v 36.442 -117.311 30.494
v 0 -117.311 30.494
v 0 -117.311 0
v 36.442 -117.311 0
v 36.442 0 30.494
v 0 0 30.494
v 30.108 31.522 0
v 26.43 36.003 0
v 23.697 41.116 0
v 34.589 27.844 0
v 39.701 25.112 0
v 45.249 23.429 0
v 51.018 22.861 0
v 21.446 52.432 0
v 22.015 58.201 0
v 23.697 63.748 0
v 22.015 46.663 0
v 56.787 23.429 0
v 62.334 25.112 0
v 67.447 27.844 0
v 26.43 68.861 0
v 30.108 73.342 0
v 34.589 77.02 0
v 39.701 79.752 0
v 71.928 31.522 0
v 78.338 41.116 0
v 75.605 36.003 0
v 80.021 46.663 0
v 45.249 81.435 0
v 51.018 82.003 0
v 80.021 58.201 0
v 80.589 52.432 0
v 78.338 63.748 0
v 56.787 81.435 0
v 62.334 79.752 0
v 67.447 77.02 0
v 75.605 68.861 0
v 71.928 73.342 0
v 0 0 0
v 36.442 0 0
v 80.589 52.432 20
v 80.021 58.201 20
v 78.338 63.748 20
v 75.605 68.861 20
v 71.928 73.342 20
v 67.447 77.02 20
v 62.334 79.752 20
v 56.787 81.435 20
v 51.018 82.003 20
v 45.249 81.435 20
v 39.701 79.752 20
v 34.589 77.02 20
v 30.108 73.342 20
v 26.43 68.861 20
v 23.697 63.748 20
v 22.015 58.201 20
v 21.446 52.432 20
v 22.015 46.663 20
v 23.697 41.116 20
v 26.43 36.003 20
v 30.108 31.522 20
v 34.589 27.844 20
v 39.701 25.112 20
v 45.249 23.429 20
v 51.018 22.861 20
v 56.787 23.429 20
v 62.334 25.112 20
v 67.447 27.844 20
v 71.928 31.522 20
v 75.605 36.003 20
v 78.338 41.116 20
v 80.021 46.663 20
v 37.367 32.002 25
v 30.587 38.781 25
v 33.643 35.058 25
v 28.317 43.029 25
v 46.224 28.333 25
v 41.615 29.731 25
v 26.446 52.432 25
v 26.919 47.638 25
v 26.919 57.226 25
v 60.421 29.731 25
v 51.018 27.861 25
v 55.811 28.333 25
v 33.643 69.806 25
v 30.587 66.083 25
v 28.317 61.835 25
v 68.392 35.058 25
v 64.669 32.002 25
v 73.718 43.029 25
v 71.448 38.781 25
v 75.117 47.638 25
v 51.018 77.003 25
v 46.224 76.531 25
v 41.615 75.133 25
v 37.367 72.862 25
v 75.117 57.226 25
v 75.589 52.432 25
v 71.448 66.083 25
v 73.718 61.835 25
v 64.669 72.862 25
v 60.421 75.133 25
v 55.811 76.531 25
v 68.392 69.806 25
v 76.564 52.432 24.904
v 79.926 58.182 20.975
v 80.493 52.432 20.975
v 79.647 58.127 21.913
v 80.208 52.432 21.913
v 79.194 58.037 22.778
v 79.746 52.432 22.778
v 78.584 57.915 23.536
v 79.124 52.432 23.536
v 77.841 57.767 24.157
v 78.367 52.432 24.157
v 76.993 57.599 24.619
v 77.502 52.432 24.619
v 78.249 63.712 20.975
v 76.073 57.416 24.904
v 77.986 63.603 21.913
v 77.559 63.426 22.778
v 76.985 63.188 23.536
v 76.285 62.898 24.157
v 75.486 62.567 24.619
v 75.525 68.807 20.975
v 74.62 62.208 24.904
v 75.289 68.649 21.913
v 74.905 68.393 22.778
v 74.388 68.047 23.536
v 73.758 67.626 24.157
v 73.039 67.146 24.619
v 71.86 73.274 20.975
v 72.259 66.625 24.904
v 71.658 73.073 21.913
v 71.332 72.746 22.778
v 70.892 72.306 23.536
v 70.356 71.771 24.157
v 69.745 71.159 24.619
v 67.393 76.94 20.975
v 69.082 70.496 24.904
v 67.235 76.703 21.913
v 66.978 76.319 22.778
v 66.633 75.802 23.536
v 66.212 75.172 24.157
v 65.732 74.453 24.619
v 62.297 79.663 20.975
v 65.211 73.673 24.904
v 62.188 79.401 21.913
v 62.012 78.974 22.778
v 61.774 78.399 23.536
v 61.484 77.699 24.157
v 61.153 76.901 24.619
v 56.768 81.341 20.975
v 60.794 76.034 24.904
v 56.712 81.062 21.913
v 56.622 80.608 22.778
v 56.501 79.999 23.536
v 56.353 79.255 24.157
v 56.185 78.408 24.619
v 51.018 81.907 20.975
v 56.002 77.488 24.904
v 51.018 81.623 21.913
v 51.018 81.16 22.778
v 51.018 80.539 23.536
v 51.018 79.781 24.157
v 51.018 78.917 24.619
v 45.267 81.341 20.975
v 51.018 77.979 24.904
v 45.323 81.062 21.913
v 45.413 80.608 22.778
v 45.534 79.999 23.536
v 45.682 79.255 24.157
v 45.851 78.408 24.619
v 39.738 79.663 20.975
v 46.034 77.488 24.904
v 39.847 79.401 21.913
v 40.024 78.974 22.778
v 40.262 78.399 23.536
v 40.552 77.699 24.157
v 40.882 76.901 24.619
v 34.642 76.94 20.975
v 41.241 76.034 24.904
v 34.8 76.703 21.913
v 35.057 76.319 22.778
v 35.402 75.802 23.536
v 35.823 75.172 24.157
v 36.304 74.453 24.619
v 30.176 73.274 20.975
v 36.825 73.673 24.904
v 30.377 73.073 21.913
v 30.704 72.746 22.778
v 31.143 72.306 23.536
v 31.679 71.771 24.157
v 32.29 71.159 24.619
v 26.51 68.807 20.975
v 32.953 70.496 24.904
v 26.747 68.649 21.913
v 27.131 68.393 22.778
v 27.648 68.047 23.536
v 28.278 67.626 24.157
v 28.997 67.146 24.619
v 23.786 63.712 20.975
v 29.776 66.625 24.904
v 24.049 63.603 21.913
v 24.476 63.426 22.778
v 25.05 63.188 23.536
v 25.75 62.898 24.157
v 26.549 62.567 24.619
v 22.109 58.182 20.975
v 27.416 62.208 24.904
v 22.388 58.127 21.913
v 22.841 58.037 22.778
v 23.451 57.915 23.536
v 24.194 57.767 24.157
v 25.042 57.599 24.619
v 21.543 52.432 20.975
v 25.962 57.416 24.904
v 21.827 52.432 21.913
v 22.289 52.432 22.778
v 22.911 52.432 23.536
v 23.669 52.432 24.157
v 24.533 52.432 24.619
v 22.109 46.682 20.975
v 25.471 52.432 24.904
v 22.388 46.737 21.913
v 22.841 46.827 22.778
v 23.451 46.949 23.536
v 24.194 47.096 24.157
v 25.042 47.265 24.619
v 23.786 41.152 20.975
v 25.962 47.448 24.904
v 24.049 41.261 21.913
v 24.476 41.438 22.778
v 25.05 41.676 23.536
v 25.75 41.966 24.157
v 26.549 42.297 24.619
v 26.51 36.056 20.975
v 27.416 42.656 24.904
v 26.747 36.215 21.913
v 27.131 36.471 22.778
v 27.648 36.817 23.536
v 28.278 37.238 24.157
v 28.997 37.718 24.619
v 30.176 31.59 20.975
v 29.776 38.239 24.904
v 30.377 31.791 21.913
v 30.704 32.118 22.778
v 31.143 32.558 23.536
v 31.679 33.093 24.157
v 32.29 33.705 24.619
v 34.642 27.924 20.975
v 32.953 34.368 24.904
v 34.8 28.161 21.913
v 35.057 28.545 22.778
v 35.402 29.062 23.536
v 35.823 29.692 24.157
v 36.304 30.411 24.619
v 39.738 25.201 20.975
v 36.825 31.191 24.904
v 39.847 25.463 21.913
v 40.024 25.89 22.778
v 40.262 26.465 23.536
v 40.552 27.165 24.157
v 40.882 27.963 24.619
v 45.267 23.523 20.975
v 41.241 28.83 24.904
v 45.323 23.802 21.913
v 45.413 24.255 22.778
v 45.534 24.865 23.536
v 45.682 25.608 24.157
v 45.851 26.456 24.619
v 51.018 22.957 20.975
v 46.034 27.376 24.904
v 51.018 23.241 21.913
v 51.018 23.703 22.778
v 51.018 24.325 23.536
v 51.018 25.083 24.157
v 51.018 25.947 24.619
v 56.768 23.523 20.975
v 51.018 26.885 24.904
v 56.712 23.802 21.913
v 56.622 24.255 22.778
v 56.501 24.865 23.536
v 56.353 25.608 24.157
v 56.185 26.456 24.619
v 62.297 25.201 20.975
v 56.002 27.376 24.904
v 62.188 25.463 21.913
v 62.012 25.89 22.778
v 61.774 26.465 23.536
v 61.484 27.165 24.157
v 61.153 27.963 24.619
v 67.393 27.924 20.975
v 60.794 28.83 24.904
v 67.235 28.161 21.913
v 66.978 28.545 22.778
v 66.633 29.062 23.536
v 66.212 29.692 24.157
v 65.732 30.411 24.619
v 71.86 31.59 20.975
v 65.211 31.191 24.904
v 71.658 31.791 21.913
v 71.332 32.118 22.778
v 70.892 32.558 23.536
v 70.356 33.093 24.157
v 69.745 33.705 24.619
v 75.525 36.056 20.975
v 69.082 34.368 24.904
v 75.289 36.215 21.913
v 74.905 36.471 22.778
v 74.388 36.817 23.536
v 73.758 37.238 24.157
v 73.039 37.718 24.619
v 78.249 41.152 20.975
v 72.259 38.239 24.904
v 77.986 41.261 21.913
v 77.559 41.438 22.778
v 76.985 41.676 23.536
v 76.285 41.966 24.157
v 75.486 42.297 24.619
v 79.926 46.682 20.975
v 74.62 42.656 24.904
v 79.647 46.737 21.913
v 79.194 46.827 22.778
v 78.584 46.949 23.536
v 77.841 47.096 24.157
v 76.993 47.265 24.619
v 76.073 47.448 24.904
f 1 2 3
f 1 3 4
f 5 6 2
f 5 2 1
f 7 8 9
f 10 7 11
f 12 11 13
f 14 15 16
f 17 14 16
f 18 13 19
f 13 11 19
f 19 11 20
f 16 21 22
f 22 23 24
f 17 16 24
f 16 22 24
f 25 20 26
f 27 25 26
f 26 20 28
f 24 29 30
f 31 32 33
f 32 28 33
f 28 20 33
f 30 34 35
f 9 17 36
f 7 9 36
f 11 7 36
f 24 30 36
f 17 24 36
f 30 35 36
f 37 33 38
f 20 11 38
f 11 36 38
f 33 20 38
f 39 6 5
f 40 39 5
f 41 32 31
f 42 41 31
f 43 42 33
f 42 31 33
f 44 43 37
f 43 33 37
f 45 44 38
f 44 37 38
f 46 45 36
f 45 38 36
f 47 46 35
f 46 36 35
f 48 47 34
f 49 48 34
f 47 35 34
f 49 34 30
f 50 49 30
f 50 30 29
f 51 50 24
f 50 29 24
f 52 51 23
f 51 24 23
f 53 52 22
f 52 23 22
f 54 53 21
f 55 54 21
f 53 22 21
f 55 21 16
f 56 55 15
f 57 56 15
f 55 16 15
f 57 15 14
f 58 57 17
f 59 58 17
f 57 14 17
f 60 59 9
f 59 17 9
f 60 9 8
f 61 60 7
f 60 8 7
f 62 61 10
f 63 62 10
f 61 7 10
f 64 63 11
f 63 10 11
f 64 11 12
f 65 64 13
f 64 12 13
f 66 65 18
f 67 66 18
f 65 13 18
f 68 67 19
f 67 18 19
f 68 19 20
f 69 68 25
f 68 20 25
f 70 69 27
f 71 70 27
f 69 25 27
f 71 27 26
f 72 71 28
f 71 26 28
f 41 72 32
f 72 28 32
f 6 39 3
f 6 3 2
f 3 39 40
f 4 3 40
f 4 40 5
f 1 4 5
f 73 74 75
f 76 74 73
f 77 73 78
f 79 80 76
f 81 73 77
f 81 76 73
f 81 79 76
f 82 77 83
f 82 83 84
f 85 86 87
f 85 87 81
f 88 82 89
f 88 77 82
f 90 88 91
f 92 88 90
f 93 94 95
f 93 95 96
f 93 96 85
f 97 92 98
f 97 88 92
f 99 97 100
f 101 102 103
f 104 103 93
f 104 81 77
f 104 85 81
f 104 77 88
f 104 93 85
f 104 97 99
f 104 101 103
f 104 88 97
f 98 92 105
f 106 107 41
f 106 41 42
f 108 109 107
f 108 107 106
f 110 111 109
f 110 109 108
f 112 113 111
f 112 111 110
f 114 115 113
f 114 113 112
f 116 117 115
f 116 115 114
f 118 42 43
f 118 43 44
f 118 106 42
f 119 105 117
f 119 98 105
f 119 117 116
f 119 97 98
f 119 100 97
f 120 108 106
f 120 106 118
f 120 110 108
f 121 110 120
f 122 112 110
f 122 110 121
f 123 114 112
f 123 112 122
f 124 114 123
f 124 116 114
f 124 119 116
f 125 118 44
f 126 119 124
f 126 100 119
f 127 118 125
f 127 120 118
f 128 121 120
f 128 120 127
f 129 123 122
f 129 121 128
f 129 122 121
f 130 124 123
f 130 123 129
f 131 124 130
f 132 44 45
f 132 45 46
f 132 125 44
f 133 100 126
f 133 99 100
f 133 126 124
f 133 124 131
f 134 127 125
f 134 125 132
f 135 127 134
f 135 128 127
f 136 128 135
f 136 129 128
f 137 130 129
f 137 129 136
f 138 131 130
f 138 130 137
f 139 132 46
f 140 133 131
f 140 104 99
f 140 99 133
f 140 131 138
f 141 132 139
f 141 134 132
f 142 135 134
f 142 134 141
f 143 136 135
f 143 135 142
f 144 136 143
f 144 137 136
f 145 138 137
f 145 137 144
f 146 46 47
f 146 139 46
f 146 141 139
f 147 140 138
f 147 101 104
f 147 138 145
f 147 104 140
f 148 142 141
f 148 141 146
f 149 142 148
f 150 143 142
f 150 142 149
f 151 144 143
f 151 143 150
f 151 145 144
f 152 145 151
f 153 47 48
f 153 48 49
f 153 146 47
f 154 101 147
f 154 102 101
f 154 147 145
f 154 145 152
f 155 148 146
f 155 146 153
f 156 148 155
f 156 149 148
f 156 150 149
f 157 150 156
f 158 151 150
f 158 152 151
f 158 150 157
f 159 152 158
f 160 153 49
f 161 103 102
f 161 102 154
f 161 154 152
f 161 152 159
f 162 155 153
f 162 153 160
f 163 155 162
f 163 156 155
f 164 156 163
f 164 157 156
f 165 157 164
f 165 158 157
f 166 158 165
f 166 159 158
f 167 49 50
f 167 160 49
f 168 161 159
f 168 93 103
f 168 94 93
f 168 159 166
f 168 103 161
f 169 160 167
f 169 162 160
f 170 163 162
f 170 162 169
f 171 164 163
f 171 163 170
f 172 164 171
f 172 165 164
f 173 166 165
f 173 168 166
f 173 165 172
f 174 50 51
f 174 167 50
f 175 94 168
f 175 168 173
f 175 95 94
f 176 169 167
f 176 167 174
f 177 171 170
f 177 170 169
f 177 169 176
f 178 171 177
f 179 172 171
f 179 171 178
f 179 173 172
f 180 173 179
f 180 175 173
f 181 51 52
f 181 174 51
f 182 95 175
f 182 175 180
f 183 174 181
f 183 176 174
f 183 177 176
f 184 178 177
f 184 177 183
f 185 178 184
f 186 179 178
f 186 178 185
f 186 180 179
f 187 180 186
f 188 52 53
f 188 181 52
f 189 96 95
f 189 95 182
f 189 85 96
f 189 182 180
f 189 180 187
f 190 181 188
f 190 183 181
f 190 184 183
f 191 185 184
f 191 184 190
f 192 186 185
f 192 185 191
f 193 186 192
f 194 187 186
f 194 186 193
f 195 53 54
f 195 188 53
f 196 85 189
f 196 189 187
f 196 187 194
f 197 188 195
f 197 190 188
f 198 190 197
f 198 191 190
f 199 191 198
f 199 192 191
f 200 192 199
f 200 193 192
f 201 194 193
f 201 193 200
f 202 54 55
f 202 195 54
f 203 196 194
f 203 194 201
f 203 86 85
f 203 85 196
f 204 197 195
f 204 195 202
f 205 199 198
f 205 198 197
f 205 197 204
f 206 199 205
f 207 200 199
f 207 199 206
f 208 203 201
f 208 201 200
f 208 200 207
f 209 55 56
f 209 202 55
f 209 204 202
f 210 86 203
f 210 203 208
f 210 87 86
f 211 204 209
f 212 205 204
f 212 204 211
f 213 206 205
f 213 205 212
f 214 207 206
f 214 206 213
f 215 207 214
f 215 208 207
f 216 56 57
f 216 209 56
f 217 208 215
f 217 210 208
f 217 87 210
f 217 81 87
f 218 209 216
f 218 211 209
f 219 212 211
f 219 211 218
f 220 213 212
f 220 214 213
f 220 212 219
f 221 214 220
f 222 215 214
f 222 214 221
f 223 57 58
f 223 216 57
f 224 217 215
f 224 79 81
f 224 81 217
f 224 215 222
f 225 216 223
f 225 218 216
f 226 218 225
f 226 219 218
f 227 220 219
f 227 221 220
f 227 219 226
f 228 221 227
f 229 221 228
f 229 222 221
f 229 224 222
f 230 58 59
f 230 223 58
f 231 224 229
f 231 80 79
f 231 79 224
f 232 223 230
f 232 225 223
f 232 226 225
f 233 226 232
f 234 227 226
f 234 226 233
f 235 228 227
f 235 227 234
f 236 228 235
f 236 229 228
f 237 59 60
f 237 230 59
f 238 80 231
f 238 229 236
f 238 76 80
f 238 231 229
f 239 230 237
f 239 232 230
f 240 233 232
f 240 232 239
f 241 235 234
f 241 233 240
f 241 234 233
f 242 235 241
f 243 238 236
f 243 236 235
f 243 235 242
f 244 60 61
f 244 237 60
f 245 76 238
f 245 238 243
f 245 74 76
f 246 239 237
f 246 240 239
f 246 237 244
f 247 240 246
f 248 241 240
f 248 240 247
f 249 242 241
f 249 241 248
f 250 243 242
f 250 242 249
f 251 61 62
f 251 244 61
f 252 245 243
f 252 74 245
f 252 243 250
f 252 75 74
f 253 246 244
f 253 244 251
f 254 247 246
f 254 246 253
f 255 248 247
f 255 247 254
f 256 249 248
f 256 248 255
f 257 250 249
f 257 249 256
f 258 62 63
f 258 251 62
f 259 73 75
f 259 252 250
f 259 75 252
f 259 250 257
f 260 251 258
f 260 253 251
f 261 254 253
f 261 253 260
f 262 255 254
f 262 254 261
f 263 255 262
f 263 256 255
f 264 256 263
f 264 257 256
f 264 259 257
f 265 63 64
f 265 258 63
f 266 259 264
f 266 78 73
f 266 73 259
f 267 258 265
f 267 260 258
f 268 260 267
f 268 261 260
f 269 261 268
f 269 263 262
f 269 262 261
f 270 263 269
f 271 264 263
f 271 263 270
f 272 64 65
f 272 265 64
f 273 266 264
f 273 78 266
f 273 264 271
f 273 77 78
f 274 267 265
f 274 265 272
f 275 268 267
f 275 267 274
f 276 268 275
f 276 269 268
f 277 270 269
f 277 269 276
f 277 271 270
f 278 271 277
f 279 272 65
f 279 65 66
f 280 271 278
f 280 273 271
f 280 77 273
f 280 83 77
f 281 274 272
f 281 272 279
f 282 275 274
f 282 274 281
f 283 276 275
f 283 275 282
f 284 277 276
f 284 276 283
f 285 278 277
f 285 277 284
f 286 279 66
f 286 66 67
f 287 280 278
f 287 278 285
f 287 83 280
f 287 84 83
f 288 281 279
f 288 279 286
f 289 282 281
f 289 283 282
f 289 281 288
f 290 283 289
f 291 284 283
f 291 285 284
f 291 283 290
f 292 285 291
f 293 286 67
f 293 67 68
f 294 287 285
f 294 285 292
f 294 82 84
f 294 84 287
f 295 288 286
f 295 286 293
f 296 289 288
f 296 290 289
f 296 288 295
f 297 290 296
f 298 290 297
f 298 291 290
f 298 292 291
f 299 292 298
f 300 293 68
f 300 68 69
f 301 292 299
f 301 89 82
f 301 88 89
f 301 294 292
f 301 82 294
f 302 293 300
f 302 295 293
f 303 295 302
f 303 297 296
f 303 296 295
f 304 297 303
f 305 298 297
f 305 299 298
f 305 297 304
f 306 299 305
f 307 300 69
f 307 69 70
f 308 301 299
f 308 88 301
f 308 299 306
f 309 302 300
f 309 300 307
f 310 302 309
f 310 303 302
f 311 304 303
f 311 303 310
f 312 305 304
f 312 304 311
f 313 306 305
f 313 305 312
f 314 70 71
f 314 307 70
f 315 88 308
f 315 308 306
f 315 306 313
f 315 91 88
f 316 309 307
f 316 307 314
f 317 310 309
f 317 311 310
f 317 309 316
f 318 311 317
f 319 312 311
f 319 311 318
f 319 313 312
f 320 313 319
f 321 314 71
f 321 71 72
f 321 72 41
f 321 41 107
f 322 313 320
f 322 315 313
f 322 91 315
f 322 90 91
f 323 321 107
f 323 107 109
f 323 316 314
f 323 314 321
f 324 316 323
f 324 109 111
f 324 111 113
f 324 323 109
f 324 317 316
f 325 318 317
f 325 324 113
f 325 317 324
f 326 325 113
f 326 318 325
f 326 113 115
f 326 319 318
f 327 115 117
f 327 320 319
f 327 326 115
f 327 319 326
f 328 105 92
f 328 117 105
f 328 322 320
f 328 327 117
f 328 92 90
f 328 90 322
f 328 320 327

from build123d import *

# Parameters (mm, degrees)
F0_W     = 110.0296452641
F0_H     = 111.7058545351
F1_DEPTH = 50
F2_R     = 5
F4_W     = 36.4418327808
F4_H     = 30.4941609502
F5_DEPTH = 117.3110455275
F6_R     = 29.5711751296
F7_DEPTH = 25
F8_R     = 5


with BuildPart() as f1:
    # F0 (on Front) → F1 (new body)
    with BuildSketch(Plane.XZ):
        Rectangle(F0_W, F0_H)
    extrude(amount=F1_DEPTH)

    # F2
    f2_edges = [f1.edges().sort_by_distance(p)[0] for p in [
        (-55.014823, -25, 55.852927),
        (55.014823, -25, 55.852927),
        (0, -50, 55.852927),
        (-55.014823, -50, 0),
        (0, -50, -55.852927),
        (55.014823, -50, 0),
    ]]
    fillet(f2_edges, radius=F2_R)


with BuildPart() as f5:
    # F4 (on Front) → F5 (new body)
    with BuildSketch(Plane.XZ):
        with Locations((18.2209163904, 15.2470804751)):
            Rectangle(F4_W, F4_H)
    extrude(amount=F5_DEPTH)


with BuildPart() as f7:
    # F6 (on Top) → F7 (new body)
    with BuildSketch(Plane.XY):
        with Locations((51.0176420212, 52.4319671094)):
            Circle(F6_R)
    extrude(amount=F7_DEPTH)

    # F8
    f8_edges = [f7.edges().sort_by_distance(p)[0] for p in [
        (21.446467, 52.431967, 25),
    ]]
    fillet(f8_edges, radius=F8_R)


solid = Compound([f5.part, f7.part])
